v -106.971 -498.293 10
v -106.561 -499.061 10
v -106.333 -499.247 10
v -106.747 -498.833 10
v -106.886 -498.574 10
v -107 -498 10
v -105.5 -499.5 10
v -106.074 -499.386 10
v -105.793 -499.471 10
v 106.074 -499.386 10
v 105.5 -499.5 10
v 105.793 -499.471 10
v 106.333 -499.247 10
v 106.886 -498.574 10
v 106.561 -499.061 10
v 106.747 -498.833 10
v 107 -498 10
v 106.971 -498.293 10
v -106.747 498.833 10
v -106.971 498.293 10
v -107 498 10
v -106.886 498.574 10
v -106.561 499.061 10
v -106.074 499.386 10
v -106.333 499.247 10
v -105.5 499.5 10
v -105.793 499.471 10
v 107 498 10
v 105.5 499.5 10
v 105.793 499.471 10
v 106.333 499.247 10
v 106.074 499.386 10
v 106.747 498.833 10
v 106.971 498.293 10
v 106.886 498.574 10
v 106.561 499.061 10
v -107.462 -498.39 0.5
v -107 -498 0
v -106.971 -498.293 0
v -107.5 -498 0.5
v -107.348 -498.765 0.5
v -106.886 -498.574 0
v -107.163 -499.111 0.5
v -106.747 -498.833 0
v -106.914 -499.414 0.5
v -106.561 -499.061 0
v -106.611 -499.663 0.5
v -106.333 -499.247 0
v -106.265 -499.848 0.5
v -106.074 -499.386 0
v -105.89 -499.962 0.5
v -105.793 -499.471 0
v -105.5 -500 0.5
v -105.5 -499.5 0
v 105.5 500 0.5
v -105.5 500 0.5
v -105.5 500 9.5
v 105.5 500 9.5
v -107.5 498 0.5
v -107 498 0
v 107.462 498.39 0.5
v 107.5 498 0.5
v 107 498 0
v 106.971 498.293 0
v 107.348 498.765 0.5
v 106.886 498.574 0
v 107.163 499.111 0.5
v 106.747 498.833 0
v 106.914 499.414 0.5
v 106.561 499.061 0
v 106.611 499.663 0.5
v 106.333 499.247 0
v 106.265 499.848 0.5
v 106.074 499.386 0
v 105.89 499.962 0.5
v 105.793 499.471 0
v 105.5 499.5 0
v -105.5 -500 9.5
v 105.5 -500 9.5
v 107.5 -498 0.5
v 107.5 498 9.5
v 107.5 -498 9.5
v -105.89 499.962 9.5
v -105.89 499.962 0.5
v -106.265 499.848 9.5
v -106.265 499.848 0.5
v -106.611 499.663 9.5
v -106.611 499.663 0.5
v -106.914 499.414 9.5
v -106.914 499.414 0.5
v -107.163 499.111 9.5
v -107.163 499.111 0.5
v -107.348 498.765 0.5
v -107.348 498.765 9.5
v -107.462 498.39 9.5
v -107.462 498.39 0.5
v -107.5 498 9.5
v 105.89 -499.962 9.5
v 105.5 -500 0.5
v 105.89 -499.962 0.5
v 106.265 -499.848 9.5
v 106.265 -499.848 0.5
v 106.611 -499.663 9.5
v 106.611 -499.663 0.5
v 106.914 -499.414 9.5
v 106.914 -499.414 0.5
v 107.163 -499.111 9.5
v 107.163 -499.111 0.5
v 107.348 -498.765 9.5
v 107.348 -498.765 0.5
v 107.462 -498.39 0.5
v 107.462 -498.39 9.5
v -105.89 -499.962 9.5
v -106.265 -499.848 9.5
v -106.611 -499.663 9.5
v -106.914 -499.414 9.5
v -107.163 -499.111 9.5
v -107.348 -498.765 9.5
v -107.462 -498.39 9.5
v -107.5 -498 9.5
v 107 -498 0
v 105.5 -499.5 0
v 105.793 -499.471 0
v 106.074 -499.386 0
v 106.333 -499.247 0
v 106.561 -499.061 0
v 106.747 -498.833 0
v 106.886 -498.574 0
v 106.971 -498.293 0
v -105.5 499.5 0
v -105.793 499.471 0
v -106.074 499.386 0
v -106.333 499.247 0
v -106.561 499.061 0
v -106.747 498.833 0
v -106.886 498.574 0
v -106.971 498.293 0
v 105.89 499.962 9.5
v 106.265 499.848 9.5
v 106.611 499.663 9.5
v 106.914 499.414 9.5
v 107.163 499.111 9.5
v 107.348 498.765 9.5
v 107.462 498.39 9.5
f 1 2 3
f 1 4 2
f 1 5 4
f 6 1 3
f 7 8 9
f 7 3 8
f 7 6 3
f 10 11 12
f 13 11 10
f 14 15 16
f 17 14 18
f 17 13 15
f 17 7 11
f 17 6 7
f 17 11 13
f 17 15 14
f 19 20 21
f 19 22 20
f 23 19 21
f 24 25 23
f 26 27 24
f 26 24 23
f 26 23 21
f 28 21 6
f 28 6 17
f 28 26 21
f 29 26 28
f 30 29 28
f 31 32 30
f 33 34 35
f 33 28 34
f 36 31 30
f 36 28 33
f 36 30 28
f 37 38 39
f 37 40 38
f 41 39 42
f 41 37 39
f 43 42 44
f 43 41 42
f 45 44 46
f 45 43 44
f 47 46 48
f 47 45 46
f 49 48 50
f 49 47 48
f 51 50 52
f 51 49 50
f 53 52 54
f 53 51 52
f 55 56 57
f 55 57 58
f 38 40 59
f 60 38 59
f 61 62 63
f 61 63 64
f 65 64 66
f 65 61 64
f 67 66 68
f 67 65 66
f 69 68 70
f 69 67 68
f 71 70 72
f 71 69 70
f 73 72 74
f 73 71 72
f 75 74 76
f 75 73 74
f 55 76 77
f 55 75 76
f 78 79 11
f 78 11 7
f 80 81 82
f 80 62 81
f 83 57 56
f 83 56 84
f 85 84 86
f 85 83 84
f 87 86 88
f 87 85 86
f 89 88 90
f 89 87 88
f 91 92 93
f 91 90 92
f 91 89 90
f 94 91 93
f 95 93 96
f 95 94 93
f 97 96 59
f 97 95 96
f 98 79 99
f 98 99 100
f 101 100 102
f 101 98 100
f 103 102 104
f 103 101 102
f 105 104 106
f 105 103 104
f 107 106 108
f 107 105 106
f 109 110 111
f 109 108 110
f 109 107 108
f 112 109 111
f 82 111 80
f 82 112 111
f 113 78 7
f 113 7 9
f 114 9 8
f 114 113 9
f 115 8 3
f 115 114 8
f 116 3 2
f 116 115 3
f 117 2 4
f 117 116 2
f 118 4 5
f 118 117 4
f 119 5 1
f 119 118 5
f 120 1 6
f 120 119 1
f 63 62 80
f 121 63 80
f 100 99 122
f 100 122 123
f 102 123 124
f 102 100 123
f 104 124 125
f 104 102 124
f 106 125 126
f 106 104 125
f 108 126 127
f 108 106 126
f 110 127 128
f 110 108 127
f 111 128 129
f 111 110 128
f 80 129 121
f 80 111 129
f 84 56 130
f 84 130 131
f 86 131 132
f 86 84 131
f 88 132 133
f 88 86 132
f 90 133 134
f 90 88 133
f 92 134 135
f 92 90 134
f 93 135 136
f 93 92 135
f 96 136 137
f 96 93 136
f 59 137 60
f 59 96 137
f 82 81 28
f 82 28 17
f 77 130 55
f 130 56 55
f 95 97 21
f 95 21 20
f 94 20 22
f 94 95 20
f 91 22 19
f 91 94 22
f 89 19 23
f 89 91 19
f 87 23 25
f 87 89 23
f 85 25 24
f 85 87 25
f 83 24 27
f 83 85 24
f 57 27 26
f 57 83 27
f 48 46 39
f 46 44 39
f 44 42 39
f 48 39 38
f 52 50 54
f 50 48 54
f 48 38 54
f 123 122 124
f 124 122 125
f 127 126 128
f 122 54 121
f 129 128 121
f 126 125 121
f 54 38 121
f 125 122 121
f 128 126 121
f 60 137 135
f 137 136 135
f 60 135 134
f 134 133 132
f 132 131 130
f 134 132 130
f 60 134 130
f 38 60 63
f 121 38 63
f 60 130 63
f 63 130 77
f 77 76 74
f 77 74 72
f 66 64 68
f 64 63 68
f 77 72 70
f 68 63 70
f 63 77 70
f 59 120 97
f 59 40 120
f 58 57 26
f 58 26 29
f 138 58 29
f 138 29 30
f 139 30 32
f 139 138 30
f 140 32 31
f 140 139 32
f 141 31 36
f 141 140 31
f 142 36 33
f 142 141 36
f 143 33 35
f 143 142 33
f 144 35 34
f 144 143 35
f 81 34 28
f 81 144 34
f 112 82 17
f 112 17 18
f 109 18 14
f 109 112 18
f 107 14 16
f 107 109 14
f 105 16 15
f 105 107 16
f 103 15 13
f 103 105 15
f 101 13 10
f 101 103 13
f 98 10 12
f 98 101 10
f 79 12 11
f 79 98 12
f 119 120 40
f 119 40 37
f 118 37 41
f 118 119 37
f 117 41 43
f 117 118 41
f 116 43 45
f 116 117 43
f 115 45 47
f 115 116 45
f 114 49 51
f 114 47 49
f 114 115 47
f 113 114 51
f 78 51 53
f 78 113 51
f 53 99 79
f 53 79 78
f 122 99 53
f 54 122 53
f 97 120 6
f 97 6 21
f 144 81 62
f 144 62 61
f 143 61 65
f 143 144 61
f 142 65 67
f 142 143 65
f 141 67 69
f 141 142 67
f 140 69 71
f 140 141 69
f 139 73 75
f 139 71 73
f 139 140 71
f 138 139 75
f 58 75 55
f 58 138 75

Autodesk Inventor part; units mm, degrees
ref_plane "YZ Plane" through (0, 0, 0) normal (1, 0, 0) x (0, 1, 0)
ref_plane "XZ Plane" through (0, 0, 0) normal (0, 1, 0) x (-1, 0, 0)
ref_plane "XY Plane" through (0, 0, 0) normal (0, 0, 1) x (1, 0, 0)
sketch "Sketch1" plane through (0, 0, 0) normal (0, 0, 1) x (1, 0, 0)
  line L0 (-107.5, 500) -> (107.5, 500)
  line L1 (107.5, 500) -> (107.5, -500)
  line L2 (107.5, -500) -> (-107.5, -500)
  line L3 (-107.5, -500) -> (-107.5, 500)
  point P0 (0, 0)
  point P1 (0, 500)
  point P2 (107.5, 0)
  dimension "d0" = 215
  dimension "d1" = 1000
extrude "Extrusion1" add sketch "Sketch1" along normal blind 10
fillet "Fillet1" radius 2 4 edges at (107.5, 500, 5) (-107.5, 500, 5) (107.5, -500, 5) (-107.5, -500, 5)
chamfer "Chamfer1" distance 0.5 angle 45 16 edges at (-107.5, 0, 10) (-106.9142, -499.4142, 10) (0, -500, 10) (106.9142, -499.4142, 10) (107.5, 0, 10) (106.9142, 499.4142, 10) (0, 500, 10) (-106.9142, 499.4142, 10) (-107.5, 0, 0) (-106.9142, -499.4142, 0) (0, -500, 0) (106.9142, -499.4142, 0) (107.5, 0, 0) (106.9142, 499.4142, 0) (0, 500, 0) (-106.9142, 499.4142, 0)
properties part number "base-plate-for-bellows" material "Aluminum 6061"
